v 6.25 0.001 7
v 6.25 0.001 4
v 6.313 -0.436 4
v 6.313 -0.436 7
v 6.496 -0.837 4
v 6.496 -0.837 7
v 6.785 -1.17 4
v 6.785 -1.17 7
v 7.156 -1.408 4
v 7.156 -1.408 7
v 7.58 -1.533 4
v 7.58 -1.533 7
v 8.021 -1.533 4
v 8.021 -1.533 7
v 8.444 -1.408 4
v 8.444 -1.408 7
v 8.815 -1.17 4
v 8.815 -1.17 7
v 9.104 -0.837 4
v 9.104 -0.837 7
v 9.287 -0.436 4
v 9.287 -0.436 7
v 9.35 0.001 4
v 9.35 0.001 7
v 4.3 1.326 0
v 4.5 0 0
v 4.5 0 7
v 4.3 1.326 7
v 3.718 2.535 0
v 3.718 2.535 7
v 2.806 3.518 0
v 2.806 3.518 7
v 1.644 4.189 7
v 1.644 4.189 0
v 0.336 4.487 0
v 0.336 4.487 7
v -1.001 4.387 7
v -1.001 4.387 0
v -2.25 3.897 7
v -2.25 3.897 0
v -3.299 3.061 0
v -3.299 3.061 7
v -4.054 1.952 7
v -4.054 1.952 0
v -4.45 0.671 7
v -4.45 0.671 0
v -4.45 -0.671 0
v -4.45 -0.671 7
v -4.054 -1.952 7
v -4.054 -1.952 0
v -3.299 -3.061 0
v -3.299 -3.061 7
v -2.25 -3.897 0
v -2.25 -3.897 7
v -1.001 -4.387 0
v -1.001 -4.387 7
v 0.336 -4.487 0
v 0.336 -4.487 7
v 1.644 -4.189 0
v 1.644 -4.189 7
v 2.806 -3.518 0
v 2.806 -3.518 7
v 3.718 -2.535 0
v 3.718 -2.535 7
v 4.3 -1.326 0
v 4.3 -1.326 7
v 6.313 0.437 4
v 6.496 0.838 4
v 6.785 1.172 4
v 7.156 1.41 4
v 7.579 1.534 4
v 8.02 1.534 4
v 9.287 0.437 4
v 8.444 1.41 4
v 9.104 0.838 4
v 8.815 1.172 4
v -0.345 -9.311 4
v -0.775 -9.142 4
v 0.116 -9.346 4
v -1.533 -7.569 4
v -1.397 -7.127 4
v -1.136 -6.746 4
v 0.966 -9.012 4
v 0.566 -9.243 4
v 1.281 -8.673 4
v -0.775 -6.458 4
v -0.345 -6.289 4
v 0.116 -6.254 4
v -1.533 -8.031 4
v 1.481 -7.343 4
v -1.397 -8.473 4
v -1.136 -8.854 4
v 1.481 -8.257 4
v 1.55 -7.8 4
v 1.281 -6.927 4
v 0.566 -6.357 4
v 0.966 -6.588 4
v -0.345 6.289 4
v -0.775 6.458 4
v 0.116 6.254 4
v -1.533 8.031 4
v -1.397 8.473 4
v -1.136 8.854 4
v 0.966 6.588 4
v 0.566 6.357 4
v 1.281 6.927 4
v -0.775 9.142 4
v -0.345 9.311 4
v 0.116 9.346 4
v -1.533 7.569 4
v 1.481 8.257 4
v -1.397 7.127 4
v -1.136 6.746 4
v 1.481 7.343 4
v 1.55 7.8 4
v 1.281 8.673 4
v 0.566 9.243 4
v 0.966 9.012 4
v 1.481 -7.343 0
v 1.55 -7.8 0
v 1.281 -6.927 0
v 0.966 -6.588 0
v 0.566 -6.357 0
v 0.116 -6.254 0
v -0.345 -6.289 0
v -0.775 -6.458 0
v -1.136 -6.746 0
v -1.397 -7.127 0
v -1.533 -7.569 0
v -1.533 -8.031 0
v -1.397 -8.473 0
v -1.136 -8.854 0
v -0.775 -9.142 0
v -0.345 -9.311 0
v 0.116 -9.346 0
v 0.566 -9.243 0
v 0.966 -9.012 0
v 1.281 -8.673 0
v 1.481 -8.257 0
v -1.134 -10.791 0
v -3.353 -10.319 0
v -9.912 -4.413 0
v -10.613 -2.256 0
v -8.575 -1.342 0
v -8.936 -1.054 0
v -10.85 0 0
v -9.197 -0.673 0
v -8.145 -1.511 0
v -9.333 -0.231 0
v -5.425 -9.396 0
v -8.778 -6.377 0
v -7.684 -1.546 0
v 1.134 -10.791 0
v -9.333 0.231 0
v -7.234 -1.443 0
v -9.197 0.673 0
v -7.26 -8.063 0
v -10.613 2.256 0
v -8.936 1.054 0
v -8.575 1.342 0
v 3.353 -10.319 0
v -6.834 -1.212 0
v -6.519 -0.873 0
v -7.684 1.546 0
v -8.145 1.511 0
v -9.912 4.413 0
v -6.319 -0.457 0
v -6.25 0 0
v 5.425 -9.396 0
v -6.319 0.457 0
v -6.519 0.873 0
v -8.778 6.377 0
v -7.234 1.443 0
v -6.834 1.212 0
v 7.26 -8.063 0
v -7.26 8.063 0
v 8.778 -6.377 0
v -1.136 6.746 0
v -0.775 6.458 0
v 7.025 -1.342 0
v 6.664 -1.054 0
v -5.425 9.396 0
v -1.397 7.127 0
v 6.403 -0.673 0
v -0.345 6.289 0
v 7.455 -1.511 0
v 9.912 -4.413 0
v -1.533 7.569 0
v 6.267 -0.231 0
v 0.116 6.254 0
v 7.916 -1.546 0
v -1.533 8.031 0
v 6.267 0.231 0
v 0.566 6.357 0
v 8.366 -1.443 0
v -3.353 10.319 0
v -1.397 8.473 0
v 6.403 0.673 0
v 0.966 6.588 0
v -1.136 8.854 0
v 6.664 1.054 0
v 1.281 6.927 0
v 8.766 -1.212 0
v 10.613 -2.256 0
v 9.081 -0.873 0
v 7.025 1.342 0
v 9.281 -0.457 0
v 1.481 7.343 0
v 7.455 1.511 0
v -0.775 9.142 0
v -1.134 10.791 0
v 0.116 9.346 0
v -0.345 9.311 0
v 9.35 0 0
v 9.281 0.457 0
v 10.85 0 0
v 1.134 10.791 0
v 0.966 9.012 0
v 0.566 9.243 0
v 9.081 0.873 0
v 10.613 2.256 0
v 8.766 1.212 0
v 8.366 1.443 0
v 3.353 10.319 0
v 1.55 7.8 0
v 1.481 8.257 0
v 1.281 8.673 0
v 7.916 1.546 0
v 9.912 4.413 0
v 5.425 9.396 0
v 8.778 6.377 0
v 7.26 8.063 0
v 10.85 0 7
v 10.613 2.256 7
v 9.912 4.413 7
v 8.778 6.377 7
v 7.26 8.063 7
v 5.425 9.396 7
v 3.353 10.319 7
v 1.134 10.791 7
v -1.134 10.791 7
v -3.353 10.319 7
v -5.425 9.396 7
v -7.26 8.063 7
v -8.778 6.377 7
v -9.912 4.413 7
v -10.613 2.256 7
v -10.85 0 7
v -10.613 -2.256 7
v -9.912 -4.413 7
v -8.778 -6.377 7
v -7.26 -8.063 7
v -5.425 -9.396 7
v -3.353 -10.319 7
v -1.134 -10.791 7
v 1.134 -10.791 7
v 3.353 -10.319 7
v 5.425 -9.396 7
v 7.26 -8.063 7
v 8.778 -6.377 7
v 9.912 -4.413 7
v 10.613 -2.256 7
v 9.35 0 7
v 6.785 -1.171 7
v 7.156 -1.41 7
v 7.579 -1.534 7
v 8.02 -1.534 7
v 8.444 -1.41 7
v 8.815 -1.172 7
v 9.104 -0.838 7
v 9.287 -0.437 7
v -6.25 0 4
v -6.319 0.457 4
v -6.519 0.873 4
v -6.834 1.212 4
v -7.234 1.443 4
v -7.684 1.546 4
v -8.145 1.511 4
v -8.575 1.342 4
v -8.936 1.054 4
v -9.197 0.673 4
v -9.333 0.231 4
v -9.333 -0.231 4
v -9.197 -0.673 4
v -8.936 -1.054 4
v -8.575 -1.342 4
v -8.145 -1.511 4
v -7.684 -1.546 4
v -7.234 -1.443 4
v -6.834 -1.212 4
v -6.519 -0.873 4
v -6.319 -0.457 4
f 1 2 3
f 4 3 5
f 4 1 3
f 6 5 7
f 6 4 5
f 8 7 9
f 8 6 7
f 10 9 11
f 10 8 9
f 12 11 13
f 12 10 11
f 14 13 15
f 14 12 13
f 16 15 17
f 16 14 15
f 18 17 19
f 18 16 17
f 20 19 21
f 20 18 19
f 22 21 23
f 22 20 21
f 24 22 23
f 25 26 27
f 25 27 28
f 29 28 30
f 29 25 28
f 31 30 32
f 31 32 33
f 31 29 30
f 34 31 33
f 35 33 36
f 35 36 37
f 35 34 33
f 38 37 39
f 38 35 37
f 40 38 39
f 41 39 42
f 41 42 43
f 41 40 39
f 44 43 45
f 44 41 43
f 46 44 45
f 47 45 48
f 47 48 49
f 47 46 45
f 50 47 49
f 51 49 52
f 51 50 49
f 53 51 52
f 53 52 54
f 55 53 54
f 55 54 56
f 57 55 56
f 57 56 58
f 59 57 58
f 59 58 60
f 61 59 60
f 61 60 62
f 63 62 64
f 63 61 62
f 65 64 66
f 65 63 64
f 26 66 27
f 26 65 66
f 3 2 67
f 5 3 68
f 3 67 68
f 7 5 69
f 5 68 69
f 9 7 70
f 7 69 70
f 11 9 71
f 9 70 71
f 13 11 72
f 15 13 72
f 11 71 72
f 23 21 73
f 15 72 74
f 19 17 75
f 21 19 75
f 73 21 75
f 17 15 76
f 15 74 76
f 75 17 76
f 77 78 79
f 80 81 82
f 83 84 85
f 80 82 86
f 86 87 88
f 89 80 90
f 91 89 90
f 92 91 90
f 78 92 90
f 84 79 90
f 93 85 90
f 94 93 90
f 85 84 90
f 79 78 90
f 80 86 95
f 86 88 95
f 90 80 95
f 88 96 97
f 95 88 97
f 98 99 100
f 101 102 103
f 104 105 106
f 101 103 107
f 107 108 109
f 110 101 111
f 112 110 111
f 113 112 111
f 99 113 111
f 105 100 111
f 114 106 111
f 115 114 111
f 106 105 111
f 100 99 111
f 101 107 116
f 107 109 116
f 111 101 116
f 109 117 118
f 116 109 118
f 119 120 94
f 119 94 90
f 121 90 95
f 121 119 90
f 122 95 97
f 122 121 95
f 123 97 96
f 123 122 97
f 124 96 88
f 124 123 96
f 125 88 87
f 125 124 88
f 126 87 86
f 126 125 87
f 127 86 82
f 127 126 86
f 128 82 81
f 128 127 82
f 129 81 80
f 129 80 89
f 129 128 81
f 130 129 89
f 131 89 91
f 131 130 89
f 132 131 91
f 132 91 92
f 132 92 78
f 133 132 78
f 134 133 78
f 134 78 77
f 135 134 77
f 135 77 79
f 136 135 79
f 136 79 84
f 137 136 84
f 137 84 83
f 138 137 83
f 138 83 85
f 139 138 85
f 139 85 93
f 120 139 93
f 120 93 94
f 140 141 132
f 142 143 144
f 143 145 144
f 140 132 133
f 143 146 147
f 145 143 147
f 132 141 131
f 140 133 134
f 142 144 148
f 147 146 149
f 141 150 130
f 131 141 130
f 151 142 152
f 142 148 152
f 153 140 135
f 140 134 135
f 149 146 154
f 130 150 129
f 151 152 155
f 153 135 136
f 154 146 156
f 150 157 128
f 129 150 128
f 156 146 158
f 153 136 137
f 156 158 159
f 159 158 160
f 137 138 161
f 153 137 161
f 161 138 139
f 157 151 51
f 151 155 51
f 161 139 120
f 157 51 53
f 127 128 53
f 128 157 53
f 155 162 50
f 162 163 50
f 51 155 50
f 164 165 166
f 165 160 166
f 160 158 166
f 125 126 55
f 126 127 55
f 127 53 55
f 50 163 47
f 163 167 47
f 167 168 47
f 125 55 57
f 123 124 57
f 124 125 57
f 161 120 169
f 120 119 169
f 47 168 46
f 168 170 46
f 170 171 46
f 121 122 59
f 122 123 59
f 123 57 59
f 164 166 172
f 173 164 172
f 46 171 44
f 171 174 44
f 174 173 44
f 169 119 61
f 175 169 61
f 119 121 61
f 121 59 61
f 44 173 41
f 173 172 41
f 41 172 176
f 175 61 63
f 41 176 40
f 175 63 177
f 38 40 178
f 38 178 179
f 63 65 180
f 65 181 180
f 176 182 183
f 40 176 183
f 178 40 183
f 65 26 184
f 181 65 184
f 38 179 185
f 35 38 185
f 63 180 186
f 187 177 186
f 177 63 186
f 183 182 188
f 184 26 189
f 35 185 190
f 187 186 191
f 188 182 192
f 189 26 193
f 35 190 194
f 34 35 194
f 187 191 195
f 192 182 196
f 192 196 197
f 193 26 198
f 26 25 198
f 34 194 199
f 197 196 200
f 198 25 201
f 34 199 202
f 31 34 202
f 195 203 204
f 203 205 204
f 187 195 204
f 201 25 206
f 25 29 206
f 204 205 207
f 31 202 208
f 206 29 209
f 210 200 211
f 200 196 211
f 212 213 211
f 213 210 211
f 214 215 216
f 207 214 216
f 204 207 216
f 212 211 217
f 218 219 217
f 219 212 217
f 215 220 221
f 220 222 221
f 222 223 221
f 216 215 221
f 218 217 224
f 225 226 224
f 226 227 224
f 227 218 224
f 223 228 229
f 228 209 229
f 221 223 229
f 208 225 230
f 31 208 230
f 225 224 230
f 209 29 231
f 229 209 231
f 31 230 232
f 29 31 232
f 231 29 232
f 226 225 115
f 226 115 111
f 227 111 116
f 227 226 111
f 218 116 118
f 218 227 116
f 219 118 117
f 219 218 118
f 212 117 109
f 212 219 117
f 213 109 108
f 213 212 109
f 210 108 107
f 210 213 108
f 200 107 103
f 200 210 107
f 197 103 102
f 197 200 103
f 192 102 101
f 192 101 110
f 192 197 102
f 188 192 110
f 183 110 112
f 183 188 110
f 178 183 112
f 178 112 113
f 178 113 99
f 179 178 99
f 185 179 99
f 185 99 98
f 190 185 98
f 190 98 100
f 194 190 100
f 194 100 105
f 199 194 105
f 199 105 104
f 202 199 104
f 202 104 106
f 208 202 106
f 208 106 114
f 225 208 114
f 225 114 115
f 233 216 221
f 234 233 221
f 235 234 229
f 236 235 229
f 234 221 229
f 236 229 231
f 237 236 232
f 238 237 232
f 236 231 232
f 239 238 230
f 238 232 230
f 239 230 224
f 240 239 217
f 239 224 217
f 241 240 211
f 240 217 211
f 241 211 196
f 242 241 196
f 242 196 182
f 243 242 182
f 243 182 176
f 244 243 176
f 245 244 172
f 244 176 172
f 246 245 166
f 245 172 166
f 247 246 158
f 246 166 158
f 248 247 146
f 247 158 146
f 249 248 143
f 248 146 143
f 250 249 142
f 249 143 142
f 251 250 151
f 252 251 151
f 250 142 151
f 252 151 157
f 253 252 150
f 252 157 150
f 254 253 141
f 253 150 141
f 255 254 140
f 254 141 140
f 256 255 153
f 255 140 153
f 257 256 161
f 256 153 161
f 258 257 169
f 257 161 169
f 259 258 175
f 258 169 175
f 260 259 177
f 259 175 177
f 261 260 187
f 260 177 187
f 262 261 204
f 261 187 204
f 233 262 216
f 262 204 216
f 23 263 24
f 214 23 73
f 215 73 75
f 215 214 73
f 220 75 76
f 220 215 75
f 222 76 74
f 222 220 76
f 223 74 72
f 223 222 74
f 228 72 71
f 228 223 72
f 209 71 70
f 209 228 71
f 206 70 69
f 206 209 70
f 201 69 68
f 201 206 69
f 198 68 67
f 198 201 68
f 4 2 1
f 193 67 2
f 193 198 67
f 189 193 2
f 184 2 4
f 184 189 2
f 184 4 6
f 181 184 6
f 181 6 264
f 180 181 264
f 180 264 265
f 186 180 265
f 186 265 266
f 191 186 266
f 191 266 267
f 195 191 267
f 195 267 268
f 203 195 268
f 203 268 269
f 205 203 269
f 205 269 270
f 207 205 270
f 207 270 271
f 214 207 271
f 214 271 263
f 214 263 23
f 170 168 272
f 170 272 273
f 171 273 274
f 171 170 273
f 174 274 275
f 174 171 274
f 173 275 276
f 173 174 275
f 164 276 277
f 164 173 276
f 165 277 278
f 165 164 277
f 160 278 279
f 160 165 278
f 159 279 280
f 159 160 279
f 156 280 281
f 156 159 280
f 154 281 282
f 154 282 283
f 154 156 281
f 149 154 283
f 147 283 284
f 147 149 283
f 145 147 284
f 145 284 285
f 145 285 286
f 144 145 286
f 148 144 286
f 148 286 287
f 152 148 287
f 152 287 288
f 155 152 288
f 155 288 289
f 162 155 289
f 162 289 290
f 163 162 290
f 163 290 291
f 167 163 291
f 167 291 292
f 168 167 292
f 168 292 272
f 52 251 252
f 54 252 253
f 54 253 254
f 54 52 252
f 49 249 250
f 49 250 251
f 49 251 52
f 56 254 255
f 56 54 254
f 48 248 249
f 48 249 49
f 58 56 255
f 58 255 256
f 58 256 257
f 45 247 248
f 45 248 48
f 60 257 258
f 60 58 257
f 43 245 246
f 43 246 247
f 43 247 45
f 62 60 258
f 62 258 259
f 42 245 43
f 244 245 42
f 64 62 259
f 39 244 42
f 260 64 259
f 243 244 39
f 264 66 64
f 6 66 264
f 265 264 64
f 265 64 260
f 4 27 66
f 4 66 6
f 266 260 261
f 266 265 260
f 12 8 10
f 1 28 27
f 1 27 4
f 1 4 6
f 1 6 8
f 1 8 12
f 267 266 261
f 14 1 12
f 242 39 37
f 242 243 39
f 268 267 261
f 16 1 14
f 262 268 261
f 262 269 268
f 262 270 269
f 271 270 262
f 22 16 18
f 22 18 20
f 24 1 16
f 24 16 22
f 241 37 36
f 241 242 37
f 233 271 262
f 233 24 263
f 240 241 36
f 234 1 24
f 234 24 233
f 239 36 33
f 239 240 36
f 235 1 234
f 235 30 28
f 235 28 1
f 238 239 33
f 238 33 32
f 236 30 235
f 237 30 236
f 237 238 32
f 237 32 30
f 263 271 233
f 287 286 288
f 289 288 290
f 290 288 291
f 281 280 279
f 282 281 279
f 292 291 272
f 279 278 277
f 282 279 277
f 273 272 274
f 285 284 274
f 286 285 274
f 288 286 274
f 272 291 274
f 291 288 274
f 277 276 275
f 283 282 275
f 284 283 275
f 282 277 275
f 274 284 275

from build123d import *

# Parameters (mm, degrees)
SKETCH1_R           = 10.85
SKETCH1_R_2         = 4.5
SKETCH1_R_3         = 1.55
BOSS_EXTRUDE1_DEPTH = 7
SKETCH2_R           = 1.55
BOSS_EXTRUDE2_DEPTH = 3


with BuildPart() as part:
    # Sketch1 → Boss-Extrude1 (new body)
    with BuildSketch(Plane.XY):
        Circle(SKETCH1_R)
        Circle(SKETCH1_R_2, mode=Mode.SUBTRACT)
        with Locations((-7.8, 0)):
            Circle(SKETCH1_R_3, mode=Mode.SUBTRACT)
        with Locations((0, 7.8)):
            Circle(SKETCH1_R_3, mode=Mode.SUBTRACT)
        with Locations((7.8, 0)):
            Circle(SKETCH1_R_3, mode=Mode.SUBTRACT)
        with Locations((0, -7.8)):
            Circle(SKETCH1_R_3, mode=Mode.SUBTRACT)
    extrude(amount=BOSS_EXTRUDE1_DEPTH)

    # Sketch2 → Boss-Extrude2 (add)
    with BuildSketch(Plane.XY.offset(7)):
        with Locations((0, 7.8)):
            Circle(SKETCH2_R)
        with Locations((-7.8, 0)):
            Circle(SKETCH2_R)
        with Locations((0, -7.8)):
            Circle(SKETCH2_R)
        with Locations((7.799999915, 0.00162894)):
            Circle(SKETCH2_R)
    extrude(amount=-BOSS_EXTRUDE2_DEPTH)


solid = part.part
